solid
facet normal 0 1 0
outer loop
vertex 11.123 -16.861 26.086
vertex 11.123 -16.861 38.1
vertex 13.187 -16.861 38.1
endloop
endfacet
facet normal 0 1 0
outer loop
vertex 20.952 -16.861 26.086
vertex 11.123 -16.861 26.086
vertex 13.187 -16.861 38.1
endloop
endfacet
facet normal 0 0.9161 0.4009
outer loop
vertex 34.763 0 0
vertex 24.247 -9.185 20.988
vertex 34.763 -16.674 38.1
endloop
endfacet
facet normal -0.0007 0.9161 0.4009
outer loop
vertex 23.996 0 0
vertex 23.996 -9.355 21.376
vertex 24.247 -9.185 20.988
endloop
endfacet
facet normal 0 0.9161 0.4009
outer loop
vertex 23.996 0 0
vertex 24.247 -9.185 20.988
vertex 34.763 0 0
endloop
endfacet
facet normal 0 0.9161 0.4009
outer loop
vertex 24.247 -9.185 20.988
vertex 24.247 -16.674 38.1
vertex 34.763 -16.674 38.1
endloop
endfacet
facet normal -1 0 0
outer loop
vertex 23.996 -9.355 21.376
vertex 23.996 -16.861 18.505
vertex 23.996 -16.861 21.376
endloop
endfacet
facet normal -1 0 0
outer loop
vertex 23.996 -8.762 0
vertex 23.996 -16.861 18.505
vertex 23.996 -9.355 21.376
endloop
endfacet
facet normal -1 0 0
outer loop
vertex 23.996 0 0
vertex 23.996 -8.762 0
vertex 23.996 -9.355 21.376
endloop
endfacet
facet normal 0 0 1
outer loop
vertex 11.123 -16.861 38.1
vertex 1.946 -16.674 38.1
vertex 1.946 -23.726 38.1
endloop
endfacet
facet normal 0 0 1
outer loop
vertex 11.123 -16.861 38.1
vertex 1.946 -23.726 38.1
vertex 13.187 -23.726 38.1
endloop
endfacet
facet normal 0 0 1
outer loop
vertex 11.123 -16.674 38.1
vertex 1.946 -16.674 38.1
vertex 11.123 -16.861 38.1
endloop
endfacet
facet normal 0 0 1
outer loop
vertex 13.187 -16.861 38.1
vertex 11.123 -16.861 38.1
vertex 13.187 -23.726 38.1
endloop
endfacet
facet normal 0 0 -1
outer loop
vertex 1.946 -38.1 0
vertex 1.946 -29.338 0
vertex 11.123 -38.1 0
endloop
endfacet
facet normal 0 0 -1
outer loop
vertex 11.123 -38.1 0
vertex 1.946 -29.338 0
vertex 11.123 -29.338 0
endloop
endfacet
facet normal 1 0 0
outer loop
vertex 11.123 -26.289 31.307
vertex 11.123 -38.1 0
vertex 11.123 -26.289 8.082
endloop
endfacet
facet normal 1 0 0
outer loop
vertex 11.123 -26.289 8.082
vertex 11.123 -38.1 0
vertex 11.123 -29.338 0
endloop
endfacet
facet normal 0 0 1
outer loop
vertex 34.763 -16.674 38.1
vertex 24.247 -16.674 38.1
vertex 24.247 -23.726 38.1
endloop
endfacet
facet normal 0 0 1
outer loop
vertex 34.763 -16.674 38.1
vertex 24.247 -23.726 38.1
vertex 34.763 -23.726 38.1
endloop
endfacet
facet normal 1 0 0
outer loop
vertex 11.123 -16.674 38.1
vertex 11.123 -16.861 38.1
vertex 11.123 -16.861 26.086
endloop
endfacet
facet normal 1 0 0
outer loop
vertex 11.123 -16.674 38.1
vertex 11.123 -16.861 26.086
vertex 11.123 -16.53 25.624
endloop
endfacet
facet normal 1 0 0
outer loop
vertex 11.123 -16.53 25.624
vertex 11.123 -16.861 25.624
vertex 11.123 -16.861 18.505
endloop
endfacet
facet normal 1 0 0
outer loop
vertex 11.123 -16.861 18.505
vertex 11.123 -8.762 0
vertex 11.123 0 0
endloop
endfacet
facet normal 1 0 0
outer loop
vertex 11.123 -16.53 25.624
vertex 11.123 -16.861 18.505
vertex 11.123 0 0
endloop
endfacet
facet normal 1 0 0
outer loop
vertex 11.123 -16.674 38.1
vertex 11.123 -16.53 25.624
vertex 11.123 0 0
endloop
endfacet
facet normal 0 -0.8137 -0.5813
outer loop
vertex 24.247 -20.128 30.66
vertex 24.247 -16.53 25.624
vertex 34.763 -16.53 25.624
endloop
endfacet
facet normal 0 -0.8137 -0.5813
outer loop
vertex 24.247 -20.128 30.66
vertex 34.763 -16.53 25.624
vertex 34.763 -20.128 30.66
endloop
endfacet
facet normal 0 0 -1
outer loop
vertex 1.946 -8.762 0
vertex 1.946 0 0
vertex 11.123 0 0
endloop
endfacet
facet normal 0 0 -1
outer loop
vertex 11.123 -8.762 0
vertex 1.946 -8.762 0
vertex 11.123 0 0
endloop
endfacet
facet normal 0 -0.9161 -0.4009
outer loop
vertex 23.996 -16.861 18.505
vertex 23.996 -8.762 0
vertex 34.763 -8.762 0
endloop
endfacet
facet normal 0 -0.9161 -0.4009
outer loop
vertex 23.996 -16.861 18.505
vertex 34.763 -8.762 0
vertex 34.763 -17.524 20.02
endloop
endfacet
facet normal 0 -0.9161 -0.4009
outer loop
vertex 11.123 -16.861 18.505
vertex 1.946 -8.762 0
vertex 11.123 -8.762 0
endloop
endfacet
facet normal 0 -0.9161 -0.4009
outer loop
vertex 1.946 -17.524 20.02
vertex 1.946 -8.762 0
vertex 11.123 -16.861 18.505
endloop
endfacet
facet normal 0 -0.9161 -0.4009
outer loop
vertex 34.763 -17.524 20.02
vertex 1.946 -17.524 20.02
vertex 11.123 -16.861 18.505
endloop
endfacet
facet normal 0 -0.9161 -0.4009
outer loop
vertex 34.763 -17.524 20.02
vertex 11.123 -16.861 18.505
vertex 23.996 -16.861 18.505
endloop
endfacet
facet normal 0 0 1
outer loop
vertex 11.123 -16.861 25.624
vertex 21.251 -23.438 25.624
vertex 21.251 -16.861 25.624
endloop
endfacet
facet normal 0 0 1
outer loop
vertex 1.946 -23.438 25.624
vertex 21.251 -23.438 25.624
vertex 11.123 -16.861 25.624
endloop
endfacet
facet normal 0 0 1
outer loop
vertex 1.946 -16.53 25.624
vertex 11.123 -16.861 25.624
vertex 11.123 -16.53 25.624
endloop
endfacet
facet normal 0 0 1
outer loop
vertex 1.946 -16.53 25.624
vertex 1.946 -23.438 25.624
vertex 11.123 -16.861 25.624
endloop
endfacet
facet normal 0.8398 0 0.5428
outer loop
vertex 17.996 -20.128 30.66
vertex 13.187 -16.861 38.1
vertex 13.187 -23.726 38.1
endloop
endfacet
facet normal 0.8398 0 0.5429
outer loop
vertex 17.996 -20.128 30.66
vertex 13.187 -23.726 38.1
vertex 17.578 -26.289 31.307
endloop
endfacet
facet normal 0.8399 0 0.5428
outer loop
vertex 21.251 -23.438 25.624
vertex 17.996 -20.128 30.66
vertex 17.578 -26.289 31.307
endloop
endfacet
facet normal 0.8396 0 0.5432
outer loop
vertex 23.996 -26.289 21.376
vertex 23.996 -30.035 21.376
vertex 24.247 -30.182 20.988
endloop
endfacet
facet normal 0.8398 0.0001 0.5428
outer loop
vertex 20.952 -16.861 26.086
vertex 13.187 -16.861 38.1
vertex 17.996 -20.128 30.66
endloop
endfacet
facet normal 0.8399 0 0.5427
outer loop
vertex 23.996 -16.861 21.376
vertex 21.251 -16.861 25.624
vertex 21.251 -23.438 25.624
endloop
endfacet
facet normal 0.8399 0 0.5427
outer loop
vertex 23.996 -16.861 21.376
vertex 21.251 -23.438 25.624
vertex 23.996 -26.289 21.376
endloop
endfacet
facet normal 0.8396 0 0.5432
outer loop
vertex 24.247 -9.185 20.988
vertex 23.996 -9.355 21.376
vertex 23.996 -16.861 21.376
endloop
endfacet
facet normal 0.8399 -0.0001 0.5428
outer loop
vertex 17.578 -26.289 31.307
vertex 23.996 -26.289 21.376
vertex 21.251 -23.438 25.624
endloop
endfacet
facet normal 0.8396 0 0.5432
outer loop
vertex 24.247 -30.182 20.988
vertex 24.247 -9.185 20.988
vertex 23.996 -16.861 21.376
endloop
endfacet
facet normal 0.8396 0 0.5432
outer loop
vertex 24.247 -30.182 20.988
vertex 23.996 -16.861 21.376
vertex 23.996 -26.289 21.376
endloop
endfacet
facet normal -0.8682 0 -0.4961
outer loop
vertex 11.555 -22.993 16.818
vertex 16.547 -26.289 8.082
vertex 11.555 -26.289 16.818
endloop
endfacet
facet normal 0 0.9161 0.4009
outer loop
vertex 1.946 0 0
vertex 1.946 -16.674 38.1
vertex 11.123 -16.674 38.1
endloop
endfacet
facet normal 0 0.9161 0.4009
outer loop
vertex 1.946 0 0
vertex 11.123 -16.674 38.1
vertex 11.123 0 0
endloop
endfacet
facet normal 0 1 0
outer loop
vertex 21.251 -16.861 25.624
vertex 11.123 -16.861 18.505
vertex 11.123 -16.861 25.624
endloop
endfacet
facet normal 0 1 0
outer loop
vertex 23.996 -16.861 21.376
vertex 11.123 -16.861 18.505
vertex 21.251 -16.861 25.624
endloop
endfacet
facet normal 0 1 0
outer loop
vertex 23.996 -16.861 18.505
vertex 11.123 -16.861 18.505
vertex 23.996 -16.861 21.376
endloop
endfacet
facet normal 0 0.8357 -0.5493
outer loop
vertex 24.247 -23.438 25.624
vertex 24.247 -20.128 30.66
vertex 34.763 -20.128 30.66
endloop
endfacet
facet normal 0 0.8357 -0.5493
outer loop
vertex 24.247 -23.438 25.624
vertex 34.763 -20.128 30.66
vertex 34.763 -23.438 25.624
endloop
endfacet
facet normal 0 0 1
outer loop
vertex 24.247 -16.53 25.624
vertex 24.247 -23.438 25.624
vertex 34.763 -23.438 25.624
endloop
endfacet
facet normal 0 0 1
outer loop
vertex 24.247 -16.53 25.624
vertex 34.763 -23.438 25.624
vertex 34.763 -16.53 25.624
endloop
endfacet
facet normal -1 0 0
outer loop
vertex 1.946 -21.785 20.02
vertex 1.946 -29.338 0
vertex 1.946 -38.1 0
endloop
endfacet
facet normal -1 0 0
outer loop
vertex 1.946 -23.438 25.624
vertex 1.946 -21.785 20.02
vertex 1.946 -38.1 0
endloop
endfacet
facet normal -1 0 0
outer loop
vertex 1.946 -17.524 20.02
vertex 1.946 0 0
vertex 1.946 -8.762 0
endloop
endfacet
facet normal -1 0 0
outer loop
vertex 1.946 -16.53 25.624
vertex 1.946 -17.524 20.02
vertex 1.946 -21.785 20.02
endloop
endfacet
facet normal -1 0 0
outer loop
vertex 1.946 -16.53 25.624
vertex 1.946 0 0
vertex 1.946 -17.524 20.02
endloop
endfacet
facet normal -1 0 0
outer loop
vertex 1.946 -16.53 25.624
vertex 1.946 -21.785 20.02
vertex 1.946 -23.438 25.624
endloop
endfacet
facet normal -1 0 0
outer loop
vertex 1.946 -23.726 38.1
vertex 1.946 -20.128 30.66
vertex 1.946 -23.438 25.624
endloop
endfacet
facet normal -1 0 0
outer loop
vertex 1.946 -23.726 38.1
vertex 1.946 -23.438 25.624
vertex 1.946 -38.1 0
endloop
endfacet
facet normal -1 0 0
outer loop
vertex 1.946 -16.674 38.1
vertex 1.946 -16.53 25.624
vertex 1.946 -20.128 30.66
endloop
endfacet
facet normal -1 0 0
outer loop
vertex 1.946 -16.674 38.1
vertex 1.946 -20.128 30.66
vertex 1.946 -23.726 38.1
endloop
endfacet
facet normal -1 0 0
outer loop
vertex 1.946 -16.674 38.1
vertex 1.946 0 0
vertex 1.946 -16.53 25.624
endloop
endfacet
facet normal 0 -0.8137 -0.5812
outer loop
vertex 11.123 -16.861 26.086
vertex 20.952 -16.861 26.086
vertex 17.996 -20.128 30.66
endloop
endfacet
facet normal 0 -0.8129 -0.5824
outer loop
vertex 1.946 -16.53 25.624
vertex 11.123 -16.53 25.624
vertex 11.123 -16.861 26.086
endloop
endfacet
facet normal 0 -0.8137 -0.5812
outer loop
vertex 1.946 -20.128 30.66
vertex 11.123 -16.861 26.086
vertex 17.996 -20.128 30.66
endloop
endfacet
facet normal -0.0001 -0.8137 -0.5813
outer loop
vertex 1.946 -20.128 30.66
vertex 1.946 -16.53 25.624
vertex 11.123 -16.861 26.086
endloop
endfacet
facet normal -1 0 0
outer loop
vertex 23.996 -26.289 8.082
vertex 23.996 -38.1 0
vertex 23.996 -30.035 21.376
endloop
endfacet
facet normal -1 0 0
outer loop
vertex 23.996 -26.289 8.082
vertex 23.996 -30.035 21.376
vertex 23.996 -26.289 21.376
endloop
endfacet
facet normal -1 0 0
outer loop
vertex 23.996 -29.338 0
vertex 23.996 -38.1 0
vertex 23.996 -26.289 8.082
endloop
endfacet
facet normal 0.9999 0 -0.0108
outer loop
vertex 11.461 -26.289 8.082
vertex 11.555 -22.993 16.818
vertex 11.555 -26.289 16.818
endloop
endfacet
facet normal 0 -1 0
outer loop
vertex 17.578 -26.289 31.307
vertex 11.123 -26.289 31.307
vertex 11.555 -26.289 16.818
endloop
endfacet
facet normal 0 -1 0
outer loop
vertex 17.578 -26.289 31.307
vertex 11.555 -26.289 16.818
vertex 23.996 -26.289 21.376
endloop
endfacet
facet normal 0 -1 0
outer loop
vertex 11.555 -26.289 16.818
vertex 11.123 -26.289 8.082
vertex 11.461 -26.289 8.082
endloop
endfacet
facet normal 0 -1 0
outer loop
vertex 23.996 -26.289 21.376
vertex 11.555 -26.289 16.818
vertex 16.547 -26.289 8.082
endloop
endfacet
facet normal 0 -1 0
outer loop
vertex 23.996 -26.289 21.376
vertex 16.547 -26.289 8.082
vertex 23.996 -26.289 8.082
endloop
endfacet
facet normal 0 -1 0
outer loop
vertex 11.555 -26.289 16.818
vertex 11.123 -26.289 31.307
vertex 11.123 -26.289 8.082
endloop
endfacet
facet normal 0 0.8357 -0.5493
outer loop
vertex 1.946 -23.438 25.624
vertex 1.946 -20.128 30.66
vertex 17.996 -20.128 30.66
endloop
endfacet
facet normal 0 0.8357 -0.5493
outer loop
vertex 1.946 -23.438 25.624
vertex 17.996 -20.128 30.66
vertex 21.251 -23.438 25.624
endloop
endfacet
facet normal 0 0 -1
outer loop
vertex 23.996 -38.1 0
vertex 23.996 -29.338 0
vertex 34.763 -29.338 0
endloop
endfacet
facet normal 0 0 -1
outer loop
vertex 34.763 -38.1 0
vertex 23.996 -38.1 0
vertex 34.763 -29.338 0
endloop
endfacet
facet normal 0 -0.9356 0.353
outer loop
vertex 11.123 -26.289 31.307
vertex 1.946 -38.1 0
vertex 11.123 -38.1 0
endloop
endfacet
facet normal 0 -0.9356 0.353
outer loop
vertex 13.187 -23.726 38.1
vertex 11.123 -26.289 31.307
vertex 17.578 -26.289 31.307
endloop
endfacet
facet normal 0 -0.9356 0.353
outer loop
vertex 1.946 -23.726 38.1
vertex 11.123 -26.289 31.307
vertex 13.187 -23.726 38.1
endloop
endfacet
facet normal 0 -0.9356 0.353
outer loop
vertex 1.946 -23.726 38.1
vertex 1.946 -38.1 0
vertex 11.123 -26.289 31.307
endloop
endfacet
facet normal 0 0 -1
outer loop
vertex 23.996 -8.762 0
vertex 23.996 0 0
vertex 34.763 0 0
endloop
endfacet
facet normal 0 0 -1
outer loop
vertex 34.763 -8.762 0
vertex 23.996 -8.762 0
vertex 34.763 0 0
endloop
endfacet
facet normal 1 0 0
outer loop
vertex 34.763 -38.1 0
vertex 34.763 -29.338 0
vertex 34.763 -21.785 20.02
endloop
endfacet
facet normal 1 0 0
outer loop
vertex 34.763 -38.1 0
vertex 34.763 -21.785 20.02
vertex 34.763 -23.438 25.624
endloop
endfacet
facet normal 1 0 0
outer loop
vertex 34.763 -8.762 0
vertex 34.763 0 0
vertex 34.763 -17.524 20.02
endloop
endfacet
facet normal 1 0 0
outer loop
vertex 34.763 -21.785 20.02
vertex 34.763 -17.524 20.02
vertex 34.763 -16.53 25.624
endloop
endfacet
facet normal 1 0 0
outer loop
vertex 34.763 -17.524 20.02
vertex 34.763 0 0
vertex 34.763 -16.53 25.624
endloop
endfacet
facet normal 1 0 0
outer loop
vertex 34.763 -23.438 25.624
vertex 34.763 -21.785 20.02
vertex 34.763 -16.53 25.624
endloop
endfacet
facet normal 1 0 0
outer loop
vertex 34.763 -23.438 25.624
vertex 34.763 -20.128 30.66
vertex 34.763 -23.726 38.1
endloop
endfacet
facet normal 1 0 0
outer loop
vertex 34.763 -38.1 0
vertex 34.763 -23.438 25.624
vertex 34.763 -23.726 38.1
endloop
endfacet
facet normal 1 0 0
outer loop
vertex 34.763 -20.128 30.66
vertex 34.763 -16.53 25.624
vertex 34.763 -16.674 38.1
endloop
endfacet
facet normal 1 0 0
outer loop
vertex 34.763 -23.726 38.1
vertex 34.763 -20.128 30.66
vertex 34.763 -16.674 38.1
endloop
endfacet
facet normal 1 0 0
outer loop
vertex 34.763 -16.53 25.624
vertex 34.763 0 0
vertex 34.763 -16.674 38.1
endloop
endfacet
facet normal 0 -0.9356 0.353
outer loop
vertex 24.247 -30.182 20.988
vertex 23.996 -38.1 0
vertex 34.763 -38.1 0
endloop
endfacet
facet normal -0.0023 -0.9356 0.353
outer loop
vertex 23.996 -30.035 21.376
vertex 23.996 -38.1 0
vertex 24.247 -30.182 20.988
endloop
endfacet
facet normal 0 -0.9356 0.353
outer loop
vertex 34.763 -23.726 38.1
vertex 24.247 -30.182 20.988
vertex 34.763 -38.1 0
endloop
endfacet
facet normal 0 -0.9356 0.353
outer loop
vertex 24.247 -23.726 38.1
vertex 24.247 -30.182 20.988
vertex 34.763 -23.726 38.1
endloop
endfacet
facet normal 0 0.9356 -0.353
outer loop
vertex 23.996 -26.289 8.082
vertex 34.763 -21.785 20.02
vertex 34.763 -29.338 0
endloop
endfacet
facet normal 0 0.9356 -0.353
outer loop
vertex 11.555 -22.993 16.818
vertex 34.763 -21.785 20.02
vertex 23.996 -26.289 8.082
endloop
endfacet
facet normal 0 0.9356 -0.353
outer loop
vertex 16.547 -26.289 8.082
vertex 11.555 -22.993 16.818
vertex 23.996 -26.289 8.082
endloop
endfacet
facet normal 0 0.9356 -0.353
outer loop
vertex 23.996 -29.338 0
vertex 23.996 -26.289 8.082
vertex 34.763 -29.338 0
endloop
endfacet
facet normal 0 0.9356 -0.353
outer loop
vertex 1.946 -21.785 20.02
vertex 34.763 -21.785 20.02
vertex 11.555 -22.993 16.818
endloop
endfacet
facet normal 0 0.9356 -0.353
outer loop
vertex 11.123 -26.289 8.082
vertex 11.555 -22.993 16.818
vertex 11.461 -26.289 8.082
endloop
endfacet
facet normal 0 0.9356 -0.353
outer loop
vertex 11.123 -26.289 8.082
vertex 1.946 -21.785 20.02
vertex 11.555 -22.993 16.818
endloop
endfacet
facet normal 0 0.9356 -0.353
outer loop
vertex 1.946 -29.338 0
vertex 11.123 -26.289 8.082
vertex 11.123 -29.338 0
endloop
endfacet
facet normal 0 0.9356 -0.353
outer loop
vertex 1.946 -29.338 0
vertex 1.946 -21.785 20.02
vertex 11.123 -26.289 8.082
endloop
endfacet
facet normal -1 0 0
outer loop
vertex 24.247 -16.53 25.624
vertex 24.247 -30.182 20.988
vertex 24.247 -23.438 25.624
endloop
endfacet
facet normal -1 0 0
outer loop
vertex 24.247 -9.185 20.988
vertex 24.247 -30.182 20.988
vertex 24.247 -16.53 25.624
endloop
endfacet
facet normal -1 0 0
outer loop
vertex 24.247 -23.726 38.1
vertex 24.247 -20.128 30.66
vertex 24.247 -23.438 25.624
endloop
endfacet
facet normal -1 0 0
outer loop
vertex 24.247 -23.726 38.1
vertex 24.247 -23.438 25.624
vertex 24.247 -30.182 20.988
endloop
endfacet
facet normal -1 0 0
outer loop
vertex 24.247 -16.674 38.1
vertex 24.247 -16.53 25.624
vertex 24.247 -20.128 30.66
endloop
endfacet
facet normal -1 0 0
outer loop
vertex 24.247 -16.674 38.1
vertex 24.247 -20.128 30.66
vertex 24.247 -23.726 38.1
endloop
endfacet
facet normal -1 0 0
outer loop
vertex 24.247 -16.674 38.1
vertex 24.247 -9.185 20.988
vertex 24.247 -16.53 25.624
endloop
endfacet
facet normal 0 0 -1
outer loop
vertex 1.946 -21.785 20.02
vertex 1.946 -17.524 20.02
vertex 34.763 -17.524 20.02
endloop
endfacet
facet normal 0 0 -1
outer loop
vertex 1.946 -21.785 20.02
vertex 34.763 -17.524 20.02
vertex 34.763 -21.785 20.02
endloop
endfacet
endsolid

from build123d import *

# Parameters (mm, degrees)
F0_W     = 38.1
F0_H     = 38.1
F1_DEPTH = 38.1
F3_DEPTH = 38.1
F4_W     = 3.3369022369
F4_H     = 38.1
F4_W_2   = 1.9459760515
F5_DEPTH = 38.1
F6_W     = 1.9311041106
F6_H     = 38.1
F6_W_2   = 12.8730144352
F6_H_2   = 16.8606620282
F6_H_3   = 11.8112149596
F6_W_3   = 3.1704599917
F7_DEPTH = 38.1


with BuildPart() as f1:
    # F0 (on Front) → F1 (new body)
    with BuildSketch(Plane.XZ):
        with Locations((19.05, 19.05)):
            Rectangle(F0_W, F0_H)
    extrude(amount=F1_DEPTH)

    # F2 (on Right) → F3 (cut)
    with BuildSketch(Plane.YZ):
        Polygon((-38.1, 0), (-23.7257722765, 38.1), (-38.1, 38.1), align=None)
        Polygon((-29.3381027877, 0), (-8.7619078, 0), (-17.5237406998, 20.0202792485), (-21.7849255435, 20.0202792485), align=None)
        Polygon((-16.6743844748, 38.1), (0, 0), (0, 38.1), align=None)
        Polygon((-23.437961936, 25.6237238646), (-20.1281253248, 25.6237238646), (-16.5304783732, 25.6237238646), (-20.1281253248, 30.6604318321), align=None)
    extrude(amount=F3_DEPTH, mode=Mode.SUBTRACT)

    # F4 (on Front) → F5 (cut)
    with BuildSketch(Plane.XZ):
        with Locations((36.4315488815, 19.05)):
            Rectangle(F4_W, F4_H)
        Polygon((24.2471154779, 38.1), (13.187199831, 38.1), (24.2471154779, 20.9880266339), align=None)
        Polygon((11.5554118529, 16.8178956956), (11.3741010427, 0), (21.1648438126, 0), align=None)
        with Locations((0.9729880258, 19.05)):
            Rectangle(F4_W_2, F4_H)
    extrude(amount=F5_DEPTH, mode=Mode.SUBTRACT)

    # F6 (on Top) → F7 (cut)
    with BuildSketch(Plane.XY):
        with Locations((0.9655520553, -19.05)):
            Rectangle(F6_W, F6_H)
        with Locations((17.5597285852, -8.4303310141)):
            Rectangle(F6_W_2, F6_H_2)
        with Locations((17.5597285852, -32.1943925202)):
            Rectangle(F6_W_2, F6_H_3)
        with Locations((36.5147700042, -19.05)):
            Rectangle(F6_W_3, F6_H)
    extrude(amount=F7_DEPTH, mode=Mode.SUBTRACT)


solid = f1.part
